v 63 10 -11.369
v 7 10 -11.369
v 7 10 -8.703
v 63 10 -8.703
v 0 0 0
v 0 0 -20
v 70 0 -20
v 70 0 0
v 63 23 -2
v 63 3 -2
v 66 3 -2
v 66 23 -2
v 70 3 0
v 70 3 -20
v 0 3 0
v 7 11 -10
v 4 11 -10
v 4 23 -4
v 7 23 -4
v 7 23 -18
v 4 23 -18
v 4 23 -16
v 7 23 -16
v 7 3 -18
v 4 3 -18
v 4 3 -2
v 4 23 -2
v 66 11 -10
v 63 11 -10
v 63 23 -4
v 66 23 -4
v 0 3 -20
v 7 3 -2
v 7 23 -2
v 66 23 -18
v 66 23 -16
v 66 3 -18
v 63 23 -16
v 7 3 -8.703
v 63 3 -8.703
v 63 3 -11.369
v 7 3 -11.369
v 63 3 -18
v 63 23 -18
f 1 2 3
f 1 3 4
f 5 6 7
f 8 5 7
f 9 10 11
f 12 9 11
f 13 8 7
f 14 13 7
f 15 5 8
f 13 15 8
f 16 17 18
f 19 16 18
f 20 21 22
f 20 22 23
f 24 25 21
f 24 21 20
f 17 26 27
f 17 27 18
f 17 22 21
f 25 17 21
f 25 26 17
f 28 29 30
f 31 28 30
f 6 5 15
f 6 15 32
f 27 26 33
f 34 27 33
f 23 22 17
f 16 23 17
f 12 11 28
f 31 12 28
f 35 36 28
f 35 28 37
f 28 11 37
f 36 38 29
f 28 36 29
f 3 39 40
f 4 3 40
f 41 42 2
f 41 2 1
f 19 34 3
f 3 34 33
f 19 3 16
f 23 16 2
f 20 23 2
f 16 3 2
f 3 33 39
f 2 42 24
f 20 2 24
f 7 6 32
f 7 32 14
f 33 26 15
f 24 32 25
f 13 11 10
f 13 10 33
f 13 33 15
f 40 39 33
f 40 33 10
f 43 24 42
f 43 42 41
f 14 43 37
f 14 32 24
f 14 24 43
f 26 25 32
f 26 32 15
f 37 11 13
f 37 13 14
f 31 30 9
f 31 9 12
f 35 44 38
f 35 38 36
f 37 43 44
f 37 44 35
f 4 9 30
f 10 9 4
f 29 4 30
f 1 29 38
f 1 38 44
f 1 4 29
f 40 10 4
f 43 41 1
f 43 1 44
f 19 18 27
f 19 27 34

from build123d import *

# Parameters (mm, degrees)
SKETCH_219_W                = 70
SKETCH_219_H                = 20
EXTRUDE_370_DEPTH           = 3
SKETCH_424_W                = 3
SKETCH_424_H                = 16
EXTRUDE_647_DEPTH           = 20
CUT_EXTRUDE_897_DEPTH       = 5
CUT_EXTRUDE_897_DEPTH_BACK  = 3
SKETCH_8_W                  = 3
SKETCH_8_H                  = 16
EXTRUDE_1252_DEPTH          = 20
CUT_EXTRUDE_1518_DEPTH      = 64
CUT_EXTRUDE_1518_DEPTH_BACK = 3
SKETCH_11_W                 = 56
SKETCH_11_H                 = 2.665153407
EXTRUDE_1792_DEPTH          = 7


with BuildPart() as part:
    # Sketch 219 → Extrude 370 (new body)
    with BuildSketch(Plane(origin=(0, 0, 0), x_dir=(1, 0, 0), z_dir=(0, 1, 0))):
        with Locations((35, 10)):
            Rectangle(SKETCH_219_W, SKETCH_219_H)
    extrude(amount=EXTRUDE_370_DEPTH)

    # Sketch 424 → Extrude 647 (add)
    with BuildSketch(Plane(origin=(0, 3, 0), x_dir=(1, 0, 0), z_dir=(0, 1, 0))):
        with Locations((5.5, 10)):
            Rectangle(SKETCH_424_W, SKETCH_424_H)
    extrude(amount=EXTRUDE_647_DEPTH)

    # Sketch 702 → Cut-Extrude 897 (cut, two sides)
    with BuildSketch(Plane.ZY.offset(-4)) as cut_extrude_897_sk:
        Polygon((-45.532064127, 82.064128255), (-16, 23), (-10, 11), (-4, 23), (25.532064127, 82.064128255), (25.532064127, 214.135534064), (-45.532064127, 214.135534064), align=None)
    extrude(amount=CUT_EXTRUDE_897_DEPTH, mode=Mode.SUBTRACT)
    extrude(cut_extrude_897_sk.sketch, amount=-CUT_EXTRUDE_897_DEPTH_BACK, mode=Mode.SUBTRACT)

    # Эскиз8 → Extrude 1252 (add)
    with BuildSketch(Plane(origin=(31.408501121, 3, 2.625790974), x_dir=(1, 0, 0), z_dir=(0, 1, 0))):
        with Locations((33.091498879, 12.625790974)):
            Rectangle(SKETCH_8_W, SKETCH_8_H)
    extrude(amount=EXTRUDE_1252_DEPTH)

    # Эскиз10 → Cut-Extrude 1518 (cut, two sides)
    with BuildSketch(Plane(origin=(63, 0, 2.625790974), x_dir=(0, 0, 1), z_dir=(-1, 0, 0))) as cut_extrude_1518_sk:
        Polygon((-48.157855101, 82.064128255), (-18.625790974, 23), (-12.625790974, 11), (-6.625790974, 23), (22.906273154, 82.064128255), (22.906273154, 214.135534064), (-48.157855101, 214.135534064), align=None)
    extrude(amount=CUT_EXTRUDE_1518_DEPTH, mode=Mode.SUBTRACT)
    extrude(cut_extrude_1518_sk.sketch, amount=-CUT_EXTRUDE_1518_DEPTH_BACK, mode=Mode.SUBTRACT)

    # Эскиз11 → Extrude 1792 (add)
    with BuildSketch(Plane(origin=(0, 3, 0), x_dir=(1, 0, 0), z_dir=(0, 1, 0))):
        with Locations((35, 10.036015586)):
            Rectangle(SKETCH_11_W, SKETCH_11_H)
    extrude(amount=EXTRUDE_1792_DEPTH)


solid = part.part
